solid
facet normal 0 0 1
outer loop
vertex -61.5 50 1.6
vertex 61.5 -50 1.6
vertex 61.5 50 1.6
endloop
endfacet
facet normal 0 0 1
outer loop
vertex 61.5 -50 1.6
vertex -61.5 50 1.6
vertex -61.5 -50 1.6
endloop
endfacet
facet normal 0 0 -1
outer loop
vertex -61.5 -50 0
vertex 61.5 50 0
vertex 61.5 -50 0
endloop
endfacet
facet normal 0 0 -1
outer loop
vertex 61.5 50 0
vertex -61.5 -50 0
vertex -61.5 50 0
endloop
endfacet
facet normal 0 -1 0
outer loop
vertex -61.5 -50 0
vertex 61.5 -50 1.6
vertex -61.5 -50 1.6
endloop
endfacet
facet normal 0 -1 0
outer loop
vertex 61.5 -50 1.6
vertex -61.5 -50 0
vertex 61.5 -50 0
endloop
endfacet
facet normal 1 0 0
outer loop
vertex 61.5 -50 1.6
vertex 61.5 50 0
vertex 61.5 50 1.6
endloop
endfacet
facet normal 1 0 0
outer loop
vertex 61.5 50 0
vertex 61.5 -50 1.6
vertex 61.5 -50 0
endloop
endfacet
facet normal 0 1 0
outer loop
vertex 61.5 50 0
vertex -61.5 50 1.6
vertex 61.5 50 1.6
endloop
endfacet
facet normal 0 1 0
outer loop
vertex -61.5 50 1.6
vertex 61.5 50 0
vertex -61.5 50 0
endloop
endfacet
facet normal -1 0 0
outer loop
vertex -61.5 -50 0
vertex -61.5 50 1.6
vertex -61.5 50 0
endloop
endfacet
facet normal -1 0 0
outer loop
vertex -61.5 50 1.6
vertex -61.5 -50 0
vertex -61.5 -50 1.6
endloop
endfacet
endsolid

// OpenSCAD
$fn = 64;

board_x = 123.0;
board_y = 100.0;
board_th = 1.6;

color([0.05, 0.45, 0.12])
translate([-board_x/2, -board_y/2, 0])
cube([board_x, board_y, board_th], center=false);
